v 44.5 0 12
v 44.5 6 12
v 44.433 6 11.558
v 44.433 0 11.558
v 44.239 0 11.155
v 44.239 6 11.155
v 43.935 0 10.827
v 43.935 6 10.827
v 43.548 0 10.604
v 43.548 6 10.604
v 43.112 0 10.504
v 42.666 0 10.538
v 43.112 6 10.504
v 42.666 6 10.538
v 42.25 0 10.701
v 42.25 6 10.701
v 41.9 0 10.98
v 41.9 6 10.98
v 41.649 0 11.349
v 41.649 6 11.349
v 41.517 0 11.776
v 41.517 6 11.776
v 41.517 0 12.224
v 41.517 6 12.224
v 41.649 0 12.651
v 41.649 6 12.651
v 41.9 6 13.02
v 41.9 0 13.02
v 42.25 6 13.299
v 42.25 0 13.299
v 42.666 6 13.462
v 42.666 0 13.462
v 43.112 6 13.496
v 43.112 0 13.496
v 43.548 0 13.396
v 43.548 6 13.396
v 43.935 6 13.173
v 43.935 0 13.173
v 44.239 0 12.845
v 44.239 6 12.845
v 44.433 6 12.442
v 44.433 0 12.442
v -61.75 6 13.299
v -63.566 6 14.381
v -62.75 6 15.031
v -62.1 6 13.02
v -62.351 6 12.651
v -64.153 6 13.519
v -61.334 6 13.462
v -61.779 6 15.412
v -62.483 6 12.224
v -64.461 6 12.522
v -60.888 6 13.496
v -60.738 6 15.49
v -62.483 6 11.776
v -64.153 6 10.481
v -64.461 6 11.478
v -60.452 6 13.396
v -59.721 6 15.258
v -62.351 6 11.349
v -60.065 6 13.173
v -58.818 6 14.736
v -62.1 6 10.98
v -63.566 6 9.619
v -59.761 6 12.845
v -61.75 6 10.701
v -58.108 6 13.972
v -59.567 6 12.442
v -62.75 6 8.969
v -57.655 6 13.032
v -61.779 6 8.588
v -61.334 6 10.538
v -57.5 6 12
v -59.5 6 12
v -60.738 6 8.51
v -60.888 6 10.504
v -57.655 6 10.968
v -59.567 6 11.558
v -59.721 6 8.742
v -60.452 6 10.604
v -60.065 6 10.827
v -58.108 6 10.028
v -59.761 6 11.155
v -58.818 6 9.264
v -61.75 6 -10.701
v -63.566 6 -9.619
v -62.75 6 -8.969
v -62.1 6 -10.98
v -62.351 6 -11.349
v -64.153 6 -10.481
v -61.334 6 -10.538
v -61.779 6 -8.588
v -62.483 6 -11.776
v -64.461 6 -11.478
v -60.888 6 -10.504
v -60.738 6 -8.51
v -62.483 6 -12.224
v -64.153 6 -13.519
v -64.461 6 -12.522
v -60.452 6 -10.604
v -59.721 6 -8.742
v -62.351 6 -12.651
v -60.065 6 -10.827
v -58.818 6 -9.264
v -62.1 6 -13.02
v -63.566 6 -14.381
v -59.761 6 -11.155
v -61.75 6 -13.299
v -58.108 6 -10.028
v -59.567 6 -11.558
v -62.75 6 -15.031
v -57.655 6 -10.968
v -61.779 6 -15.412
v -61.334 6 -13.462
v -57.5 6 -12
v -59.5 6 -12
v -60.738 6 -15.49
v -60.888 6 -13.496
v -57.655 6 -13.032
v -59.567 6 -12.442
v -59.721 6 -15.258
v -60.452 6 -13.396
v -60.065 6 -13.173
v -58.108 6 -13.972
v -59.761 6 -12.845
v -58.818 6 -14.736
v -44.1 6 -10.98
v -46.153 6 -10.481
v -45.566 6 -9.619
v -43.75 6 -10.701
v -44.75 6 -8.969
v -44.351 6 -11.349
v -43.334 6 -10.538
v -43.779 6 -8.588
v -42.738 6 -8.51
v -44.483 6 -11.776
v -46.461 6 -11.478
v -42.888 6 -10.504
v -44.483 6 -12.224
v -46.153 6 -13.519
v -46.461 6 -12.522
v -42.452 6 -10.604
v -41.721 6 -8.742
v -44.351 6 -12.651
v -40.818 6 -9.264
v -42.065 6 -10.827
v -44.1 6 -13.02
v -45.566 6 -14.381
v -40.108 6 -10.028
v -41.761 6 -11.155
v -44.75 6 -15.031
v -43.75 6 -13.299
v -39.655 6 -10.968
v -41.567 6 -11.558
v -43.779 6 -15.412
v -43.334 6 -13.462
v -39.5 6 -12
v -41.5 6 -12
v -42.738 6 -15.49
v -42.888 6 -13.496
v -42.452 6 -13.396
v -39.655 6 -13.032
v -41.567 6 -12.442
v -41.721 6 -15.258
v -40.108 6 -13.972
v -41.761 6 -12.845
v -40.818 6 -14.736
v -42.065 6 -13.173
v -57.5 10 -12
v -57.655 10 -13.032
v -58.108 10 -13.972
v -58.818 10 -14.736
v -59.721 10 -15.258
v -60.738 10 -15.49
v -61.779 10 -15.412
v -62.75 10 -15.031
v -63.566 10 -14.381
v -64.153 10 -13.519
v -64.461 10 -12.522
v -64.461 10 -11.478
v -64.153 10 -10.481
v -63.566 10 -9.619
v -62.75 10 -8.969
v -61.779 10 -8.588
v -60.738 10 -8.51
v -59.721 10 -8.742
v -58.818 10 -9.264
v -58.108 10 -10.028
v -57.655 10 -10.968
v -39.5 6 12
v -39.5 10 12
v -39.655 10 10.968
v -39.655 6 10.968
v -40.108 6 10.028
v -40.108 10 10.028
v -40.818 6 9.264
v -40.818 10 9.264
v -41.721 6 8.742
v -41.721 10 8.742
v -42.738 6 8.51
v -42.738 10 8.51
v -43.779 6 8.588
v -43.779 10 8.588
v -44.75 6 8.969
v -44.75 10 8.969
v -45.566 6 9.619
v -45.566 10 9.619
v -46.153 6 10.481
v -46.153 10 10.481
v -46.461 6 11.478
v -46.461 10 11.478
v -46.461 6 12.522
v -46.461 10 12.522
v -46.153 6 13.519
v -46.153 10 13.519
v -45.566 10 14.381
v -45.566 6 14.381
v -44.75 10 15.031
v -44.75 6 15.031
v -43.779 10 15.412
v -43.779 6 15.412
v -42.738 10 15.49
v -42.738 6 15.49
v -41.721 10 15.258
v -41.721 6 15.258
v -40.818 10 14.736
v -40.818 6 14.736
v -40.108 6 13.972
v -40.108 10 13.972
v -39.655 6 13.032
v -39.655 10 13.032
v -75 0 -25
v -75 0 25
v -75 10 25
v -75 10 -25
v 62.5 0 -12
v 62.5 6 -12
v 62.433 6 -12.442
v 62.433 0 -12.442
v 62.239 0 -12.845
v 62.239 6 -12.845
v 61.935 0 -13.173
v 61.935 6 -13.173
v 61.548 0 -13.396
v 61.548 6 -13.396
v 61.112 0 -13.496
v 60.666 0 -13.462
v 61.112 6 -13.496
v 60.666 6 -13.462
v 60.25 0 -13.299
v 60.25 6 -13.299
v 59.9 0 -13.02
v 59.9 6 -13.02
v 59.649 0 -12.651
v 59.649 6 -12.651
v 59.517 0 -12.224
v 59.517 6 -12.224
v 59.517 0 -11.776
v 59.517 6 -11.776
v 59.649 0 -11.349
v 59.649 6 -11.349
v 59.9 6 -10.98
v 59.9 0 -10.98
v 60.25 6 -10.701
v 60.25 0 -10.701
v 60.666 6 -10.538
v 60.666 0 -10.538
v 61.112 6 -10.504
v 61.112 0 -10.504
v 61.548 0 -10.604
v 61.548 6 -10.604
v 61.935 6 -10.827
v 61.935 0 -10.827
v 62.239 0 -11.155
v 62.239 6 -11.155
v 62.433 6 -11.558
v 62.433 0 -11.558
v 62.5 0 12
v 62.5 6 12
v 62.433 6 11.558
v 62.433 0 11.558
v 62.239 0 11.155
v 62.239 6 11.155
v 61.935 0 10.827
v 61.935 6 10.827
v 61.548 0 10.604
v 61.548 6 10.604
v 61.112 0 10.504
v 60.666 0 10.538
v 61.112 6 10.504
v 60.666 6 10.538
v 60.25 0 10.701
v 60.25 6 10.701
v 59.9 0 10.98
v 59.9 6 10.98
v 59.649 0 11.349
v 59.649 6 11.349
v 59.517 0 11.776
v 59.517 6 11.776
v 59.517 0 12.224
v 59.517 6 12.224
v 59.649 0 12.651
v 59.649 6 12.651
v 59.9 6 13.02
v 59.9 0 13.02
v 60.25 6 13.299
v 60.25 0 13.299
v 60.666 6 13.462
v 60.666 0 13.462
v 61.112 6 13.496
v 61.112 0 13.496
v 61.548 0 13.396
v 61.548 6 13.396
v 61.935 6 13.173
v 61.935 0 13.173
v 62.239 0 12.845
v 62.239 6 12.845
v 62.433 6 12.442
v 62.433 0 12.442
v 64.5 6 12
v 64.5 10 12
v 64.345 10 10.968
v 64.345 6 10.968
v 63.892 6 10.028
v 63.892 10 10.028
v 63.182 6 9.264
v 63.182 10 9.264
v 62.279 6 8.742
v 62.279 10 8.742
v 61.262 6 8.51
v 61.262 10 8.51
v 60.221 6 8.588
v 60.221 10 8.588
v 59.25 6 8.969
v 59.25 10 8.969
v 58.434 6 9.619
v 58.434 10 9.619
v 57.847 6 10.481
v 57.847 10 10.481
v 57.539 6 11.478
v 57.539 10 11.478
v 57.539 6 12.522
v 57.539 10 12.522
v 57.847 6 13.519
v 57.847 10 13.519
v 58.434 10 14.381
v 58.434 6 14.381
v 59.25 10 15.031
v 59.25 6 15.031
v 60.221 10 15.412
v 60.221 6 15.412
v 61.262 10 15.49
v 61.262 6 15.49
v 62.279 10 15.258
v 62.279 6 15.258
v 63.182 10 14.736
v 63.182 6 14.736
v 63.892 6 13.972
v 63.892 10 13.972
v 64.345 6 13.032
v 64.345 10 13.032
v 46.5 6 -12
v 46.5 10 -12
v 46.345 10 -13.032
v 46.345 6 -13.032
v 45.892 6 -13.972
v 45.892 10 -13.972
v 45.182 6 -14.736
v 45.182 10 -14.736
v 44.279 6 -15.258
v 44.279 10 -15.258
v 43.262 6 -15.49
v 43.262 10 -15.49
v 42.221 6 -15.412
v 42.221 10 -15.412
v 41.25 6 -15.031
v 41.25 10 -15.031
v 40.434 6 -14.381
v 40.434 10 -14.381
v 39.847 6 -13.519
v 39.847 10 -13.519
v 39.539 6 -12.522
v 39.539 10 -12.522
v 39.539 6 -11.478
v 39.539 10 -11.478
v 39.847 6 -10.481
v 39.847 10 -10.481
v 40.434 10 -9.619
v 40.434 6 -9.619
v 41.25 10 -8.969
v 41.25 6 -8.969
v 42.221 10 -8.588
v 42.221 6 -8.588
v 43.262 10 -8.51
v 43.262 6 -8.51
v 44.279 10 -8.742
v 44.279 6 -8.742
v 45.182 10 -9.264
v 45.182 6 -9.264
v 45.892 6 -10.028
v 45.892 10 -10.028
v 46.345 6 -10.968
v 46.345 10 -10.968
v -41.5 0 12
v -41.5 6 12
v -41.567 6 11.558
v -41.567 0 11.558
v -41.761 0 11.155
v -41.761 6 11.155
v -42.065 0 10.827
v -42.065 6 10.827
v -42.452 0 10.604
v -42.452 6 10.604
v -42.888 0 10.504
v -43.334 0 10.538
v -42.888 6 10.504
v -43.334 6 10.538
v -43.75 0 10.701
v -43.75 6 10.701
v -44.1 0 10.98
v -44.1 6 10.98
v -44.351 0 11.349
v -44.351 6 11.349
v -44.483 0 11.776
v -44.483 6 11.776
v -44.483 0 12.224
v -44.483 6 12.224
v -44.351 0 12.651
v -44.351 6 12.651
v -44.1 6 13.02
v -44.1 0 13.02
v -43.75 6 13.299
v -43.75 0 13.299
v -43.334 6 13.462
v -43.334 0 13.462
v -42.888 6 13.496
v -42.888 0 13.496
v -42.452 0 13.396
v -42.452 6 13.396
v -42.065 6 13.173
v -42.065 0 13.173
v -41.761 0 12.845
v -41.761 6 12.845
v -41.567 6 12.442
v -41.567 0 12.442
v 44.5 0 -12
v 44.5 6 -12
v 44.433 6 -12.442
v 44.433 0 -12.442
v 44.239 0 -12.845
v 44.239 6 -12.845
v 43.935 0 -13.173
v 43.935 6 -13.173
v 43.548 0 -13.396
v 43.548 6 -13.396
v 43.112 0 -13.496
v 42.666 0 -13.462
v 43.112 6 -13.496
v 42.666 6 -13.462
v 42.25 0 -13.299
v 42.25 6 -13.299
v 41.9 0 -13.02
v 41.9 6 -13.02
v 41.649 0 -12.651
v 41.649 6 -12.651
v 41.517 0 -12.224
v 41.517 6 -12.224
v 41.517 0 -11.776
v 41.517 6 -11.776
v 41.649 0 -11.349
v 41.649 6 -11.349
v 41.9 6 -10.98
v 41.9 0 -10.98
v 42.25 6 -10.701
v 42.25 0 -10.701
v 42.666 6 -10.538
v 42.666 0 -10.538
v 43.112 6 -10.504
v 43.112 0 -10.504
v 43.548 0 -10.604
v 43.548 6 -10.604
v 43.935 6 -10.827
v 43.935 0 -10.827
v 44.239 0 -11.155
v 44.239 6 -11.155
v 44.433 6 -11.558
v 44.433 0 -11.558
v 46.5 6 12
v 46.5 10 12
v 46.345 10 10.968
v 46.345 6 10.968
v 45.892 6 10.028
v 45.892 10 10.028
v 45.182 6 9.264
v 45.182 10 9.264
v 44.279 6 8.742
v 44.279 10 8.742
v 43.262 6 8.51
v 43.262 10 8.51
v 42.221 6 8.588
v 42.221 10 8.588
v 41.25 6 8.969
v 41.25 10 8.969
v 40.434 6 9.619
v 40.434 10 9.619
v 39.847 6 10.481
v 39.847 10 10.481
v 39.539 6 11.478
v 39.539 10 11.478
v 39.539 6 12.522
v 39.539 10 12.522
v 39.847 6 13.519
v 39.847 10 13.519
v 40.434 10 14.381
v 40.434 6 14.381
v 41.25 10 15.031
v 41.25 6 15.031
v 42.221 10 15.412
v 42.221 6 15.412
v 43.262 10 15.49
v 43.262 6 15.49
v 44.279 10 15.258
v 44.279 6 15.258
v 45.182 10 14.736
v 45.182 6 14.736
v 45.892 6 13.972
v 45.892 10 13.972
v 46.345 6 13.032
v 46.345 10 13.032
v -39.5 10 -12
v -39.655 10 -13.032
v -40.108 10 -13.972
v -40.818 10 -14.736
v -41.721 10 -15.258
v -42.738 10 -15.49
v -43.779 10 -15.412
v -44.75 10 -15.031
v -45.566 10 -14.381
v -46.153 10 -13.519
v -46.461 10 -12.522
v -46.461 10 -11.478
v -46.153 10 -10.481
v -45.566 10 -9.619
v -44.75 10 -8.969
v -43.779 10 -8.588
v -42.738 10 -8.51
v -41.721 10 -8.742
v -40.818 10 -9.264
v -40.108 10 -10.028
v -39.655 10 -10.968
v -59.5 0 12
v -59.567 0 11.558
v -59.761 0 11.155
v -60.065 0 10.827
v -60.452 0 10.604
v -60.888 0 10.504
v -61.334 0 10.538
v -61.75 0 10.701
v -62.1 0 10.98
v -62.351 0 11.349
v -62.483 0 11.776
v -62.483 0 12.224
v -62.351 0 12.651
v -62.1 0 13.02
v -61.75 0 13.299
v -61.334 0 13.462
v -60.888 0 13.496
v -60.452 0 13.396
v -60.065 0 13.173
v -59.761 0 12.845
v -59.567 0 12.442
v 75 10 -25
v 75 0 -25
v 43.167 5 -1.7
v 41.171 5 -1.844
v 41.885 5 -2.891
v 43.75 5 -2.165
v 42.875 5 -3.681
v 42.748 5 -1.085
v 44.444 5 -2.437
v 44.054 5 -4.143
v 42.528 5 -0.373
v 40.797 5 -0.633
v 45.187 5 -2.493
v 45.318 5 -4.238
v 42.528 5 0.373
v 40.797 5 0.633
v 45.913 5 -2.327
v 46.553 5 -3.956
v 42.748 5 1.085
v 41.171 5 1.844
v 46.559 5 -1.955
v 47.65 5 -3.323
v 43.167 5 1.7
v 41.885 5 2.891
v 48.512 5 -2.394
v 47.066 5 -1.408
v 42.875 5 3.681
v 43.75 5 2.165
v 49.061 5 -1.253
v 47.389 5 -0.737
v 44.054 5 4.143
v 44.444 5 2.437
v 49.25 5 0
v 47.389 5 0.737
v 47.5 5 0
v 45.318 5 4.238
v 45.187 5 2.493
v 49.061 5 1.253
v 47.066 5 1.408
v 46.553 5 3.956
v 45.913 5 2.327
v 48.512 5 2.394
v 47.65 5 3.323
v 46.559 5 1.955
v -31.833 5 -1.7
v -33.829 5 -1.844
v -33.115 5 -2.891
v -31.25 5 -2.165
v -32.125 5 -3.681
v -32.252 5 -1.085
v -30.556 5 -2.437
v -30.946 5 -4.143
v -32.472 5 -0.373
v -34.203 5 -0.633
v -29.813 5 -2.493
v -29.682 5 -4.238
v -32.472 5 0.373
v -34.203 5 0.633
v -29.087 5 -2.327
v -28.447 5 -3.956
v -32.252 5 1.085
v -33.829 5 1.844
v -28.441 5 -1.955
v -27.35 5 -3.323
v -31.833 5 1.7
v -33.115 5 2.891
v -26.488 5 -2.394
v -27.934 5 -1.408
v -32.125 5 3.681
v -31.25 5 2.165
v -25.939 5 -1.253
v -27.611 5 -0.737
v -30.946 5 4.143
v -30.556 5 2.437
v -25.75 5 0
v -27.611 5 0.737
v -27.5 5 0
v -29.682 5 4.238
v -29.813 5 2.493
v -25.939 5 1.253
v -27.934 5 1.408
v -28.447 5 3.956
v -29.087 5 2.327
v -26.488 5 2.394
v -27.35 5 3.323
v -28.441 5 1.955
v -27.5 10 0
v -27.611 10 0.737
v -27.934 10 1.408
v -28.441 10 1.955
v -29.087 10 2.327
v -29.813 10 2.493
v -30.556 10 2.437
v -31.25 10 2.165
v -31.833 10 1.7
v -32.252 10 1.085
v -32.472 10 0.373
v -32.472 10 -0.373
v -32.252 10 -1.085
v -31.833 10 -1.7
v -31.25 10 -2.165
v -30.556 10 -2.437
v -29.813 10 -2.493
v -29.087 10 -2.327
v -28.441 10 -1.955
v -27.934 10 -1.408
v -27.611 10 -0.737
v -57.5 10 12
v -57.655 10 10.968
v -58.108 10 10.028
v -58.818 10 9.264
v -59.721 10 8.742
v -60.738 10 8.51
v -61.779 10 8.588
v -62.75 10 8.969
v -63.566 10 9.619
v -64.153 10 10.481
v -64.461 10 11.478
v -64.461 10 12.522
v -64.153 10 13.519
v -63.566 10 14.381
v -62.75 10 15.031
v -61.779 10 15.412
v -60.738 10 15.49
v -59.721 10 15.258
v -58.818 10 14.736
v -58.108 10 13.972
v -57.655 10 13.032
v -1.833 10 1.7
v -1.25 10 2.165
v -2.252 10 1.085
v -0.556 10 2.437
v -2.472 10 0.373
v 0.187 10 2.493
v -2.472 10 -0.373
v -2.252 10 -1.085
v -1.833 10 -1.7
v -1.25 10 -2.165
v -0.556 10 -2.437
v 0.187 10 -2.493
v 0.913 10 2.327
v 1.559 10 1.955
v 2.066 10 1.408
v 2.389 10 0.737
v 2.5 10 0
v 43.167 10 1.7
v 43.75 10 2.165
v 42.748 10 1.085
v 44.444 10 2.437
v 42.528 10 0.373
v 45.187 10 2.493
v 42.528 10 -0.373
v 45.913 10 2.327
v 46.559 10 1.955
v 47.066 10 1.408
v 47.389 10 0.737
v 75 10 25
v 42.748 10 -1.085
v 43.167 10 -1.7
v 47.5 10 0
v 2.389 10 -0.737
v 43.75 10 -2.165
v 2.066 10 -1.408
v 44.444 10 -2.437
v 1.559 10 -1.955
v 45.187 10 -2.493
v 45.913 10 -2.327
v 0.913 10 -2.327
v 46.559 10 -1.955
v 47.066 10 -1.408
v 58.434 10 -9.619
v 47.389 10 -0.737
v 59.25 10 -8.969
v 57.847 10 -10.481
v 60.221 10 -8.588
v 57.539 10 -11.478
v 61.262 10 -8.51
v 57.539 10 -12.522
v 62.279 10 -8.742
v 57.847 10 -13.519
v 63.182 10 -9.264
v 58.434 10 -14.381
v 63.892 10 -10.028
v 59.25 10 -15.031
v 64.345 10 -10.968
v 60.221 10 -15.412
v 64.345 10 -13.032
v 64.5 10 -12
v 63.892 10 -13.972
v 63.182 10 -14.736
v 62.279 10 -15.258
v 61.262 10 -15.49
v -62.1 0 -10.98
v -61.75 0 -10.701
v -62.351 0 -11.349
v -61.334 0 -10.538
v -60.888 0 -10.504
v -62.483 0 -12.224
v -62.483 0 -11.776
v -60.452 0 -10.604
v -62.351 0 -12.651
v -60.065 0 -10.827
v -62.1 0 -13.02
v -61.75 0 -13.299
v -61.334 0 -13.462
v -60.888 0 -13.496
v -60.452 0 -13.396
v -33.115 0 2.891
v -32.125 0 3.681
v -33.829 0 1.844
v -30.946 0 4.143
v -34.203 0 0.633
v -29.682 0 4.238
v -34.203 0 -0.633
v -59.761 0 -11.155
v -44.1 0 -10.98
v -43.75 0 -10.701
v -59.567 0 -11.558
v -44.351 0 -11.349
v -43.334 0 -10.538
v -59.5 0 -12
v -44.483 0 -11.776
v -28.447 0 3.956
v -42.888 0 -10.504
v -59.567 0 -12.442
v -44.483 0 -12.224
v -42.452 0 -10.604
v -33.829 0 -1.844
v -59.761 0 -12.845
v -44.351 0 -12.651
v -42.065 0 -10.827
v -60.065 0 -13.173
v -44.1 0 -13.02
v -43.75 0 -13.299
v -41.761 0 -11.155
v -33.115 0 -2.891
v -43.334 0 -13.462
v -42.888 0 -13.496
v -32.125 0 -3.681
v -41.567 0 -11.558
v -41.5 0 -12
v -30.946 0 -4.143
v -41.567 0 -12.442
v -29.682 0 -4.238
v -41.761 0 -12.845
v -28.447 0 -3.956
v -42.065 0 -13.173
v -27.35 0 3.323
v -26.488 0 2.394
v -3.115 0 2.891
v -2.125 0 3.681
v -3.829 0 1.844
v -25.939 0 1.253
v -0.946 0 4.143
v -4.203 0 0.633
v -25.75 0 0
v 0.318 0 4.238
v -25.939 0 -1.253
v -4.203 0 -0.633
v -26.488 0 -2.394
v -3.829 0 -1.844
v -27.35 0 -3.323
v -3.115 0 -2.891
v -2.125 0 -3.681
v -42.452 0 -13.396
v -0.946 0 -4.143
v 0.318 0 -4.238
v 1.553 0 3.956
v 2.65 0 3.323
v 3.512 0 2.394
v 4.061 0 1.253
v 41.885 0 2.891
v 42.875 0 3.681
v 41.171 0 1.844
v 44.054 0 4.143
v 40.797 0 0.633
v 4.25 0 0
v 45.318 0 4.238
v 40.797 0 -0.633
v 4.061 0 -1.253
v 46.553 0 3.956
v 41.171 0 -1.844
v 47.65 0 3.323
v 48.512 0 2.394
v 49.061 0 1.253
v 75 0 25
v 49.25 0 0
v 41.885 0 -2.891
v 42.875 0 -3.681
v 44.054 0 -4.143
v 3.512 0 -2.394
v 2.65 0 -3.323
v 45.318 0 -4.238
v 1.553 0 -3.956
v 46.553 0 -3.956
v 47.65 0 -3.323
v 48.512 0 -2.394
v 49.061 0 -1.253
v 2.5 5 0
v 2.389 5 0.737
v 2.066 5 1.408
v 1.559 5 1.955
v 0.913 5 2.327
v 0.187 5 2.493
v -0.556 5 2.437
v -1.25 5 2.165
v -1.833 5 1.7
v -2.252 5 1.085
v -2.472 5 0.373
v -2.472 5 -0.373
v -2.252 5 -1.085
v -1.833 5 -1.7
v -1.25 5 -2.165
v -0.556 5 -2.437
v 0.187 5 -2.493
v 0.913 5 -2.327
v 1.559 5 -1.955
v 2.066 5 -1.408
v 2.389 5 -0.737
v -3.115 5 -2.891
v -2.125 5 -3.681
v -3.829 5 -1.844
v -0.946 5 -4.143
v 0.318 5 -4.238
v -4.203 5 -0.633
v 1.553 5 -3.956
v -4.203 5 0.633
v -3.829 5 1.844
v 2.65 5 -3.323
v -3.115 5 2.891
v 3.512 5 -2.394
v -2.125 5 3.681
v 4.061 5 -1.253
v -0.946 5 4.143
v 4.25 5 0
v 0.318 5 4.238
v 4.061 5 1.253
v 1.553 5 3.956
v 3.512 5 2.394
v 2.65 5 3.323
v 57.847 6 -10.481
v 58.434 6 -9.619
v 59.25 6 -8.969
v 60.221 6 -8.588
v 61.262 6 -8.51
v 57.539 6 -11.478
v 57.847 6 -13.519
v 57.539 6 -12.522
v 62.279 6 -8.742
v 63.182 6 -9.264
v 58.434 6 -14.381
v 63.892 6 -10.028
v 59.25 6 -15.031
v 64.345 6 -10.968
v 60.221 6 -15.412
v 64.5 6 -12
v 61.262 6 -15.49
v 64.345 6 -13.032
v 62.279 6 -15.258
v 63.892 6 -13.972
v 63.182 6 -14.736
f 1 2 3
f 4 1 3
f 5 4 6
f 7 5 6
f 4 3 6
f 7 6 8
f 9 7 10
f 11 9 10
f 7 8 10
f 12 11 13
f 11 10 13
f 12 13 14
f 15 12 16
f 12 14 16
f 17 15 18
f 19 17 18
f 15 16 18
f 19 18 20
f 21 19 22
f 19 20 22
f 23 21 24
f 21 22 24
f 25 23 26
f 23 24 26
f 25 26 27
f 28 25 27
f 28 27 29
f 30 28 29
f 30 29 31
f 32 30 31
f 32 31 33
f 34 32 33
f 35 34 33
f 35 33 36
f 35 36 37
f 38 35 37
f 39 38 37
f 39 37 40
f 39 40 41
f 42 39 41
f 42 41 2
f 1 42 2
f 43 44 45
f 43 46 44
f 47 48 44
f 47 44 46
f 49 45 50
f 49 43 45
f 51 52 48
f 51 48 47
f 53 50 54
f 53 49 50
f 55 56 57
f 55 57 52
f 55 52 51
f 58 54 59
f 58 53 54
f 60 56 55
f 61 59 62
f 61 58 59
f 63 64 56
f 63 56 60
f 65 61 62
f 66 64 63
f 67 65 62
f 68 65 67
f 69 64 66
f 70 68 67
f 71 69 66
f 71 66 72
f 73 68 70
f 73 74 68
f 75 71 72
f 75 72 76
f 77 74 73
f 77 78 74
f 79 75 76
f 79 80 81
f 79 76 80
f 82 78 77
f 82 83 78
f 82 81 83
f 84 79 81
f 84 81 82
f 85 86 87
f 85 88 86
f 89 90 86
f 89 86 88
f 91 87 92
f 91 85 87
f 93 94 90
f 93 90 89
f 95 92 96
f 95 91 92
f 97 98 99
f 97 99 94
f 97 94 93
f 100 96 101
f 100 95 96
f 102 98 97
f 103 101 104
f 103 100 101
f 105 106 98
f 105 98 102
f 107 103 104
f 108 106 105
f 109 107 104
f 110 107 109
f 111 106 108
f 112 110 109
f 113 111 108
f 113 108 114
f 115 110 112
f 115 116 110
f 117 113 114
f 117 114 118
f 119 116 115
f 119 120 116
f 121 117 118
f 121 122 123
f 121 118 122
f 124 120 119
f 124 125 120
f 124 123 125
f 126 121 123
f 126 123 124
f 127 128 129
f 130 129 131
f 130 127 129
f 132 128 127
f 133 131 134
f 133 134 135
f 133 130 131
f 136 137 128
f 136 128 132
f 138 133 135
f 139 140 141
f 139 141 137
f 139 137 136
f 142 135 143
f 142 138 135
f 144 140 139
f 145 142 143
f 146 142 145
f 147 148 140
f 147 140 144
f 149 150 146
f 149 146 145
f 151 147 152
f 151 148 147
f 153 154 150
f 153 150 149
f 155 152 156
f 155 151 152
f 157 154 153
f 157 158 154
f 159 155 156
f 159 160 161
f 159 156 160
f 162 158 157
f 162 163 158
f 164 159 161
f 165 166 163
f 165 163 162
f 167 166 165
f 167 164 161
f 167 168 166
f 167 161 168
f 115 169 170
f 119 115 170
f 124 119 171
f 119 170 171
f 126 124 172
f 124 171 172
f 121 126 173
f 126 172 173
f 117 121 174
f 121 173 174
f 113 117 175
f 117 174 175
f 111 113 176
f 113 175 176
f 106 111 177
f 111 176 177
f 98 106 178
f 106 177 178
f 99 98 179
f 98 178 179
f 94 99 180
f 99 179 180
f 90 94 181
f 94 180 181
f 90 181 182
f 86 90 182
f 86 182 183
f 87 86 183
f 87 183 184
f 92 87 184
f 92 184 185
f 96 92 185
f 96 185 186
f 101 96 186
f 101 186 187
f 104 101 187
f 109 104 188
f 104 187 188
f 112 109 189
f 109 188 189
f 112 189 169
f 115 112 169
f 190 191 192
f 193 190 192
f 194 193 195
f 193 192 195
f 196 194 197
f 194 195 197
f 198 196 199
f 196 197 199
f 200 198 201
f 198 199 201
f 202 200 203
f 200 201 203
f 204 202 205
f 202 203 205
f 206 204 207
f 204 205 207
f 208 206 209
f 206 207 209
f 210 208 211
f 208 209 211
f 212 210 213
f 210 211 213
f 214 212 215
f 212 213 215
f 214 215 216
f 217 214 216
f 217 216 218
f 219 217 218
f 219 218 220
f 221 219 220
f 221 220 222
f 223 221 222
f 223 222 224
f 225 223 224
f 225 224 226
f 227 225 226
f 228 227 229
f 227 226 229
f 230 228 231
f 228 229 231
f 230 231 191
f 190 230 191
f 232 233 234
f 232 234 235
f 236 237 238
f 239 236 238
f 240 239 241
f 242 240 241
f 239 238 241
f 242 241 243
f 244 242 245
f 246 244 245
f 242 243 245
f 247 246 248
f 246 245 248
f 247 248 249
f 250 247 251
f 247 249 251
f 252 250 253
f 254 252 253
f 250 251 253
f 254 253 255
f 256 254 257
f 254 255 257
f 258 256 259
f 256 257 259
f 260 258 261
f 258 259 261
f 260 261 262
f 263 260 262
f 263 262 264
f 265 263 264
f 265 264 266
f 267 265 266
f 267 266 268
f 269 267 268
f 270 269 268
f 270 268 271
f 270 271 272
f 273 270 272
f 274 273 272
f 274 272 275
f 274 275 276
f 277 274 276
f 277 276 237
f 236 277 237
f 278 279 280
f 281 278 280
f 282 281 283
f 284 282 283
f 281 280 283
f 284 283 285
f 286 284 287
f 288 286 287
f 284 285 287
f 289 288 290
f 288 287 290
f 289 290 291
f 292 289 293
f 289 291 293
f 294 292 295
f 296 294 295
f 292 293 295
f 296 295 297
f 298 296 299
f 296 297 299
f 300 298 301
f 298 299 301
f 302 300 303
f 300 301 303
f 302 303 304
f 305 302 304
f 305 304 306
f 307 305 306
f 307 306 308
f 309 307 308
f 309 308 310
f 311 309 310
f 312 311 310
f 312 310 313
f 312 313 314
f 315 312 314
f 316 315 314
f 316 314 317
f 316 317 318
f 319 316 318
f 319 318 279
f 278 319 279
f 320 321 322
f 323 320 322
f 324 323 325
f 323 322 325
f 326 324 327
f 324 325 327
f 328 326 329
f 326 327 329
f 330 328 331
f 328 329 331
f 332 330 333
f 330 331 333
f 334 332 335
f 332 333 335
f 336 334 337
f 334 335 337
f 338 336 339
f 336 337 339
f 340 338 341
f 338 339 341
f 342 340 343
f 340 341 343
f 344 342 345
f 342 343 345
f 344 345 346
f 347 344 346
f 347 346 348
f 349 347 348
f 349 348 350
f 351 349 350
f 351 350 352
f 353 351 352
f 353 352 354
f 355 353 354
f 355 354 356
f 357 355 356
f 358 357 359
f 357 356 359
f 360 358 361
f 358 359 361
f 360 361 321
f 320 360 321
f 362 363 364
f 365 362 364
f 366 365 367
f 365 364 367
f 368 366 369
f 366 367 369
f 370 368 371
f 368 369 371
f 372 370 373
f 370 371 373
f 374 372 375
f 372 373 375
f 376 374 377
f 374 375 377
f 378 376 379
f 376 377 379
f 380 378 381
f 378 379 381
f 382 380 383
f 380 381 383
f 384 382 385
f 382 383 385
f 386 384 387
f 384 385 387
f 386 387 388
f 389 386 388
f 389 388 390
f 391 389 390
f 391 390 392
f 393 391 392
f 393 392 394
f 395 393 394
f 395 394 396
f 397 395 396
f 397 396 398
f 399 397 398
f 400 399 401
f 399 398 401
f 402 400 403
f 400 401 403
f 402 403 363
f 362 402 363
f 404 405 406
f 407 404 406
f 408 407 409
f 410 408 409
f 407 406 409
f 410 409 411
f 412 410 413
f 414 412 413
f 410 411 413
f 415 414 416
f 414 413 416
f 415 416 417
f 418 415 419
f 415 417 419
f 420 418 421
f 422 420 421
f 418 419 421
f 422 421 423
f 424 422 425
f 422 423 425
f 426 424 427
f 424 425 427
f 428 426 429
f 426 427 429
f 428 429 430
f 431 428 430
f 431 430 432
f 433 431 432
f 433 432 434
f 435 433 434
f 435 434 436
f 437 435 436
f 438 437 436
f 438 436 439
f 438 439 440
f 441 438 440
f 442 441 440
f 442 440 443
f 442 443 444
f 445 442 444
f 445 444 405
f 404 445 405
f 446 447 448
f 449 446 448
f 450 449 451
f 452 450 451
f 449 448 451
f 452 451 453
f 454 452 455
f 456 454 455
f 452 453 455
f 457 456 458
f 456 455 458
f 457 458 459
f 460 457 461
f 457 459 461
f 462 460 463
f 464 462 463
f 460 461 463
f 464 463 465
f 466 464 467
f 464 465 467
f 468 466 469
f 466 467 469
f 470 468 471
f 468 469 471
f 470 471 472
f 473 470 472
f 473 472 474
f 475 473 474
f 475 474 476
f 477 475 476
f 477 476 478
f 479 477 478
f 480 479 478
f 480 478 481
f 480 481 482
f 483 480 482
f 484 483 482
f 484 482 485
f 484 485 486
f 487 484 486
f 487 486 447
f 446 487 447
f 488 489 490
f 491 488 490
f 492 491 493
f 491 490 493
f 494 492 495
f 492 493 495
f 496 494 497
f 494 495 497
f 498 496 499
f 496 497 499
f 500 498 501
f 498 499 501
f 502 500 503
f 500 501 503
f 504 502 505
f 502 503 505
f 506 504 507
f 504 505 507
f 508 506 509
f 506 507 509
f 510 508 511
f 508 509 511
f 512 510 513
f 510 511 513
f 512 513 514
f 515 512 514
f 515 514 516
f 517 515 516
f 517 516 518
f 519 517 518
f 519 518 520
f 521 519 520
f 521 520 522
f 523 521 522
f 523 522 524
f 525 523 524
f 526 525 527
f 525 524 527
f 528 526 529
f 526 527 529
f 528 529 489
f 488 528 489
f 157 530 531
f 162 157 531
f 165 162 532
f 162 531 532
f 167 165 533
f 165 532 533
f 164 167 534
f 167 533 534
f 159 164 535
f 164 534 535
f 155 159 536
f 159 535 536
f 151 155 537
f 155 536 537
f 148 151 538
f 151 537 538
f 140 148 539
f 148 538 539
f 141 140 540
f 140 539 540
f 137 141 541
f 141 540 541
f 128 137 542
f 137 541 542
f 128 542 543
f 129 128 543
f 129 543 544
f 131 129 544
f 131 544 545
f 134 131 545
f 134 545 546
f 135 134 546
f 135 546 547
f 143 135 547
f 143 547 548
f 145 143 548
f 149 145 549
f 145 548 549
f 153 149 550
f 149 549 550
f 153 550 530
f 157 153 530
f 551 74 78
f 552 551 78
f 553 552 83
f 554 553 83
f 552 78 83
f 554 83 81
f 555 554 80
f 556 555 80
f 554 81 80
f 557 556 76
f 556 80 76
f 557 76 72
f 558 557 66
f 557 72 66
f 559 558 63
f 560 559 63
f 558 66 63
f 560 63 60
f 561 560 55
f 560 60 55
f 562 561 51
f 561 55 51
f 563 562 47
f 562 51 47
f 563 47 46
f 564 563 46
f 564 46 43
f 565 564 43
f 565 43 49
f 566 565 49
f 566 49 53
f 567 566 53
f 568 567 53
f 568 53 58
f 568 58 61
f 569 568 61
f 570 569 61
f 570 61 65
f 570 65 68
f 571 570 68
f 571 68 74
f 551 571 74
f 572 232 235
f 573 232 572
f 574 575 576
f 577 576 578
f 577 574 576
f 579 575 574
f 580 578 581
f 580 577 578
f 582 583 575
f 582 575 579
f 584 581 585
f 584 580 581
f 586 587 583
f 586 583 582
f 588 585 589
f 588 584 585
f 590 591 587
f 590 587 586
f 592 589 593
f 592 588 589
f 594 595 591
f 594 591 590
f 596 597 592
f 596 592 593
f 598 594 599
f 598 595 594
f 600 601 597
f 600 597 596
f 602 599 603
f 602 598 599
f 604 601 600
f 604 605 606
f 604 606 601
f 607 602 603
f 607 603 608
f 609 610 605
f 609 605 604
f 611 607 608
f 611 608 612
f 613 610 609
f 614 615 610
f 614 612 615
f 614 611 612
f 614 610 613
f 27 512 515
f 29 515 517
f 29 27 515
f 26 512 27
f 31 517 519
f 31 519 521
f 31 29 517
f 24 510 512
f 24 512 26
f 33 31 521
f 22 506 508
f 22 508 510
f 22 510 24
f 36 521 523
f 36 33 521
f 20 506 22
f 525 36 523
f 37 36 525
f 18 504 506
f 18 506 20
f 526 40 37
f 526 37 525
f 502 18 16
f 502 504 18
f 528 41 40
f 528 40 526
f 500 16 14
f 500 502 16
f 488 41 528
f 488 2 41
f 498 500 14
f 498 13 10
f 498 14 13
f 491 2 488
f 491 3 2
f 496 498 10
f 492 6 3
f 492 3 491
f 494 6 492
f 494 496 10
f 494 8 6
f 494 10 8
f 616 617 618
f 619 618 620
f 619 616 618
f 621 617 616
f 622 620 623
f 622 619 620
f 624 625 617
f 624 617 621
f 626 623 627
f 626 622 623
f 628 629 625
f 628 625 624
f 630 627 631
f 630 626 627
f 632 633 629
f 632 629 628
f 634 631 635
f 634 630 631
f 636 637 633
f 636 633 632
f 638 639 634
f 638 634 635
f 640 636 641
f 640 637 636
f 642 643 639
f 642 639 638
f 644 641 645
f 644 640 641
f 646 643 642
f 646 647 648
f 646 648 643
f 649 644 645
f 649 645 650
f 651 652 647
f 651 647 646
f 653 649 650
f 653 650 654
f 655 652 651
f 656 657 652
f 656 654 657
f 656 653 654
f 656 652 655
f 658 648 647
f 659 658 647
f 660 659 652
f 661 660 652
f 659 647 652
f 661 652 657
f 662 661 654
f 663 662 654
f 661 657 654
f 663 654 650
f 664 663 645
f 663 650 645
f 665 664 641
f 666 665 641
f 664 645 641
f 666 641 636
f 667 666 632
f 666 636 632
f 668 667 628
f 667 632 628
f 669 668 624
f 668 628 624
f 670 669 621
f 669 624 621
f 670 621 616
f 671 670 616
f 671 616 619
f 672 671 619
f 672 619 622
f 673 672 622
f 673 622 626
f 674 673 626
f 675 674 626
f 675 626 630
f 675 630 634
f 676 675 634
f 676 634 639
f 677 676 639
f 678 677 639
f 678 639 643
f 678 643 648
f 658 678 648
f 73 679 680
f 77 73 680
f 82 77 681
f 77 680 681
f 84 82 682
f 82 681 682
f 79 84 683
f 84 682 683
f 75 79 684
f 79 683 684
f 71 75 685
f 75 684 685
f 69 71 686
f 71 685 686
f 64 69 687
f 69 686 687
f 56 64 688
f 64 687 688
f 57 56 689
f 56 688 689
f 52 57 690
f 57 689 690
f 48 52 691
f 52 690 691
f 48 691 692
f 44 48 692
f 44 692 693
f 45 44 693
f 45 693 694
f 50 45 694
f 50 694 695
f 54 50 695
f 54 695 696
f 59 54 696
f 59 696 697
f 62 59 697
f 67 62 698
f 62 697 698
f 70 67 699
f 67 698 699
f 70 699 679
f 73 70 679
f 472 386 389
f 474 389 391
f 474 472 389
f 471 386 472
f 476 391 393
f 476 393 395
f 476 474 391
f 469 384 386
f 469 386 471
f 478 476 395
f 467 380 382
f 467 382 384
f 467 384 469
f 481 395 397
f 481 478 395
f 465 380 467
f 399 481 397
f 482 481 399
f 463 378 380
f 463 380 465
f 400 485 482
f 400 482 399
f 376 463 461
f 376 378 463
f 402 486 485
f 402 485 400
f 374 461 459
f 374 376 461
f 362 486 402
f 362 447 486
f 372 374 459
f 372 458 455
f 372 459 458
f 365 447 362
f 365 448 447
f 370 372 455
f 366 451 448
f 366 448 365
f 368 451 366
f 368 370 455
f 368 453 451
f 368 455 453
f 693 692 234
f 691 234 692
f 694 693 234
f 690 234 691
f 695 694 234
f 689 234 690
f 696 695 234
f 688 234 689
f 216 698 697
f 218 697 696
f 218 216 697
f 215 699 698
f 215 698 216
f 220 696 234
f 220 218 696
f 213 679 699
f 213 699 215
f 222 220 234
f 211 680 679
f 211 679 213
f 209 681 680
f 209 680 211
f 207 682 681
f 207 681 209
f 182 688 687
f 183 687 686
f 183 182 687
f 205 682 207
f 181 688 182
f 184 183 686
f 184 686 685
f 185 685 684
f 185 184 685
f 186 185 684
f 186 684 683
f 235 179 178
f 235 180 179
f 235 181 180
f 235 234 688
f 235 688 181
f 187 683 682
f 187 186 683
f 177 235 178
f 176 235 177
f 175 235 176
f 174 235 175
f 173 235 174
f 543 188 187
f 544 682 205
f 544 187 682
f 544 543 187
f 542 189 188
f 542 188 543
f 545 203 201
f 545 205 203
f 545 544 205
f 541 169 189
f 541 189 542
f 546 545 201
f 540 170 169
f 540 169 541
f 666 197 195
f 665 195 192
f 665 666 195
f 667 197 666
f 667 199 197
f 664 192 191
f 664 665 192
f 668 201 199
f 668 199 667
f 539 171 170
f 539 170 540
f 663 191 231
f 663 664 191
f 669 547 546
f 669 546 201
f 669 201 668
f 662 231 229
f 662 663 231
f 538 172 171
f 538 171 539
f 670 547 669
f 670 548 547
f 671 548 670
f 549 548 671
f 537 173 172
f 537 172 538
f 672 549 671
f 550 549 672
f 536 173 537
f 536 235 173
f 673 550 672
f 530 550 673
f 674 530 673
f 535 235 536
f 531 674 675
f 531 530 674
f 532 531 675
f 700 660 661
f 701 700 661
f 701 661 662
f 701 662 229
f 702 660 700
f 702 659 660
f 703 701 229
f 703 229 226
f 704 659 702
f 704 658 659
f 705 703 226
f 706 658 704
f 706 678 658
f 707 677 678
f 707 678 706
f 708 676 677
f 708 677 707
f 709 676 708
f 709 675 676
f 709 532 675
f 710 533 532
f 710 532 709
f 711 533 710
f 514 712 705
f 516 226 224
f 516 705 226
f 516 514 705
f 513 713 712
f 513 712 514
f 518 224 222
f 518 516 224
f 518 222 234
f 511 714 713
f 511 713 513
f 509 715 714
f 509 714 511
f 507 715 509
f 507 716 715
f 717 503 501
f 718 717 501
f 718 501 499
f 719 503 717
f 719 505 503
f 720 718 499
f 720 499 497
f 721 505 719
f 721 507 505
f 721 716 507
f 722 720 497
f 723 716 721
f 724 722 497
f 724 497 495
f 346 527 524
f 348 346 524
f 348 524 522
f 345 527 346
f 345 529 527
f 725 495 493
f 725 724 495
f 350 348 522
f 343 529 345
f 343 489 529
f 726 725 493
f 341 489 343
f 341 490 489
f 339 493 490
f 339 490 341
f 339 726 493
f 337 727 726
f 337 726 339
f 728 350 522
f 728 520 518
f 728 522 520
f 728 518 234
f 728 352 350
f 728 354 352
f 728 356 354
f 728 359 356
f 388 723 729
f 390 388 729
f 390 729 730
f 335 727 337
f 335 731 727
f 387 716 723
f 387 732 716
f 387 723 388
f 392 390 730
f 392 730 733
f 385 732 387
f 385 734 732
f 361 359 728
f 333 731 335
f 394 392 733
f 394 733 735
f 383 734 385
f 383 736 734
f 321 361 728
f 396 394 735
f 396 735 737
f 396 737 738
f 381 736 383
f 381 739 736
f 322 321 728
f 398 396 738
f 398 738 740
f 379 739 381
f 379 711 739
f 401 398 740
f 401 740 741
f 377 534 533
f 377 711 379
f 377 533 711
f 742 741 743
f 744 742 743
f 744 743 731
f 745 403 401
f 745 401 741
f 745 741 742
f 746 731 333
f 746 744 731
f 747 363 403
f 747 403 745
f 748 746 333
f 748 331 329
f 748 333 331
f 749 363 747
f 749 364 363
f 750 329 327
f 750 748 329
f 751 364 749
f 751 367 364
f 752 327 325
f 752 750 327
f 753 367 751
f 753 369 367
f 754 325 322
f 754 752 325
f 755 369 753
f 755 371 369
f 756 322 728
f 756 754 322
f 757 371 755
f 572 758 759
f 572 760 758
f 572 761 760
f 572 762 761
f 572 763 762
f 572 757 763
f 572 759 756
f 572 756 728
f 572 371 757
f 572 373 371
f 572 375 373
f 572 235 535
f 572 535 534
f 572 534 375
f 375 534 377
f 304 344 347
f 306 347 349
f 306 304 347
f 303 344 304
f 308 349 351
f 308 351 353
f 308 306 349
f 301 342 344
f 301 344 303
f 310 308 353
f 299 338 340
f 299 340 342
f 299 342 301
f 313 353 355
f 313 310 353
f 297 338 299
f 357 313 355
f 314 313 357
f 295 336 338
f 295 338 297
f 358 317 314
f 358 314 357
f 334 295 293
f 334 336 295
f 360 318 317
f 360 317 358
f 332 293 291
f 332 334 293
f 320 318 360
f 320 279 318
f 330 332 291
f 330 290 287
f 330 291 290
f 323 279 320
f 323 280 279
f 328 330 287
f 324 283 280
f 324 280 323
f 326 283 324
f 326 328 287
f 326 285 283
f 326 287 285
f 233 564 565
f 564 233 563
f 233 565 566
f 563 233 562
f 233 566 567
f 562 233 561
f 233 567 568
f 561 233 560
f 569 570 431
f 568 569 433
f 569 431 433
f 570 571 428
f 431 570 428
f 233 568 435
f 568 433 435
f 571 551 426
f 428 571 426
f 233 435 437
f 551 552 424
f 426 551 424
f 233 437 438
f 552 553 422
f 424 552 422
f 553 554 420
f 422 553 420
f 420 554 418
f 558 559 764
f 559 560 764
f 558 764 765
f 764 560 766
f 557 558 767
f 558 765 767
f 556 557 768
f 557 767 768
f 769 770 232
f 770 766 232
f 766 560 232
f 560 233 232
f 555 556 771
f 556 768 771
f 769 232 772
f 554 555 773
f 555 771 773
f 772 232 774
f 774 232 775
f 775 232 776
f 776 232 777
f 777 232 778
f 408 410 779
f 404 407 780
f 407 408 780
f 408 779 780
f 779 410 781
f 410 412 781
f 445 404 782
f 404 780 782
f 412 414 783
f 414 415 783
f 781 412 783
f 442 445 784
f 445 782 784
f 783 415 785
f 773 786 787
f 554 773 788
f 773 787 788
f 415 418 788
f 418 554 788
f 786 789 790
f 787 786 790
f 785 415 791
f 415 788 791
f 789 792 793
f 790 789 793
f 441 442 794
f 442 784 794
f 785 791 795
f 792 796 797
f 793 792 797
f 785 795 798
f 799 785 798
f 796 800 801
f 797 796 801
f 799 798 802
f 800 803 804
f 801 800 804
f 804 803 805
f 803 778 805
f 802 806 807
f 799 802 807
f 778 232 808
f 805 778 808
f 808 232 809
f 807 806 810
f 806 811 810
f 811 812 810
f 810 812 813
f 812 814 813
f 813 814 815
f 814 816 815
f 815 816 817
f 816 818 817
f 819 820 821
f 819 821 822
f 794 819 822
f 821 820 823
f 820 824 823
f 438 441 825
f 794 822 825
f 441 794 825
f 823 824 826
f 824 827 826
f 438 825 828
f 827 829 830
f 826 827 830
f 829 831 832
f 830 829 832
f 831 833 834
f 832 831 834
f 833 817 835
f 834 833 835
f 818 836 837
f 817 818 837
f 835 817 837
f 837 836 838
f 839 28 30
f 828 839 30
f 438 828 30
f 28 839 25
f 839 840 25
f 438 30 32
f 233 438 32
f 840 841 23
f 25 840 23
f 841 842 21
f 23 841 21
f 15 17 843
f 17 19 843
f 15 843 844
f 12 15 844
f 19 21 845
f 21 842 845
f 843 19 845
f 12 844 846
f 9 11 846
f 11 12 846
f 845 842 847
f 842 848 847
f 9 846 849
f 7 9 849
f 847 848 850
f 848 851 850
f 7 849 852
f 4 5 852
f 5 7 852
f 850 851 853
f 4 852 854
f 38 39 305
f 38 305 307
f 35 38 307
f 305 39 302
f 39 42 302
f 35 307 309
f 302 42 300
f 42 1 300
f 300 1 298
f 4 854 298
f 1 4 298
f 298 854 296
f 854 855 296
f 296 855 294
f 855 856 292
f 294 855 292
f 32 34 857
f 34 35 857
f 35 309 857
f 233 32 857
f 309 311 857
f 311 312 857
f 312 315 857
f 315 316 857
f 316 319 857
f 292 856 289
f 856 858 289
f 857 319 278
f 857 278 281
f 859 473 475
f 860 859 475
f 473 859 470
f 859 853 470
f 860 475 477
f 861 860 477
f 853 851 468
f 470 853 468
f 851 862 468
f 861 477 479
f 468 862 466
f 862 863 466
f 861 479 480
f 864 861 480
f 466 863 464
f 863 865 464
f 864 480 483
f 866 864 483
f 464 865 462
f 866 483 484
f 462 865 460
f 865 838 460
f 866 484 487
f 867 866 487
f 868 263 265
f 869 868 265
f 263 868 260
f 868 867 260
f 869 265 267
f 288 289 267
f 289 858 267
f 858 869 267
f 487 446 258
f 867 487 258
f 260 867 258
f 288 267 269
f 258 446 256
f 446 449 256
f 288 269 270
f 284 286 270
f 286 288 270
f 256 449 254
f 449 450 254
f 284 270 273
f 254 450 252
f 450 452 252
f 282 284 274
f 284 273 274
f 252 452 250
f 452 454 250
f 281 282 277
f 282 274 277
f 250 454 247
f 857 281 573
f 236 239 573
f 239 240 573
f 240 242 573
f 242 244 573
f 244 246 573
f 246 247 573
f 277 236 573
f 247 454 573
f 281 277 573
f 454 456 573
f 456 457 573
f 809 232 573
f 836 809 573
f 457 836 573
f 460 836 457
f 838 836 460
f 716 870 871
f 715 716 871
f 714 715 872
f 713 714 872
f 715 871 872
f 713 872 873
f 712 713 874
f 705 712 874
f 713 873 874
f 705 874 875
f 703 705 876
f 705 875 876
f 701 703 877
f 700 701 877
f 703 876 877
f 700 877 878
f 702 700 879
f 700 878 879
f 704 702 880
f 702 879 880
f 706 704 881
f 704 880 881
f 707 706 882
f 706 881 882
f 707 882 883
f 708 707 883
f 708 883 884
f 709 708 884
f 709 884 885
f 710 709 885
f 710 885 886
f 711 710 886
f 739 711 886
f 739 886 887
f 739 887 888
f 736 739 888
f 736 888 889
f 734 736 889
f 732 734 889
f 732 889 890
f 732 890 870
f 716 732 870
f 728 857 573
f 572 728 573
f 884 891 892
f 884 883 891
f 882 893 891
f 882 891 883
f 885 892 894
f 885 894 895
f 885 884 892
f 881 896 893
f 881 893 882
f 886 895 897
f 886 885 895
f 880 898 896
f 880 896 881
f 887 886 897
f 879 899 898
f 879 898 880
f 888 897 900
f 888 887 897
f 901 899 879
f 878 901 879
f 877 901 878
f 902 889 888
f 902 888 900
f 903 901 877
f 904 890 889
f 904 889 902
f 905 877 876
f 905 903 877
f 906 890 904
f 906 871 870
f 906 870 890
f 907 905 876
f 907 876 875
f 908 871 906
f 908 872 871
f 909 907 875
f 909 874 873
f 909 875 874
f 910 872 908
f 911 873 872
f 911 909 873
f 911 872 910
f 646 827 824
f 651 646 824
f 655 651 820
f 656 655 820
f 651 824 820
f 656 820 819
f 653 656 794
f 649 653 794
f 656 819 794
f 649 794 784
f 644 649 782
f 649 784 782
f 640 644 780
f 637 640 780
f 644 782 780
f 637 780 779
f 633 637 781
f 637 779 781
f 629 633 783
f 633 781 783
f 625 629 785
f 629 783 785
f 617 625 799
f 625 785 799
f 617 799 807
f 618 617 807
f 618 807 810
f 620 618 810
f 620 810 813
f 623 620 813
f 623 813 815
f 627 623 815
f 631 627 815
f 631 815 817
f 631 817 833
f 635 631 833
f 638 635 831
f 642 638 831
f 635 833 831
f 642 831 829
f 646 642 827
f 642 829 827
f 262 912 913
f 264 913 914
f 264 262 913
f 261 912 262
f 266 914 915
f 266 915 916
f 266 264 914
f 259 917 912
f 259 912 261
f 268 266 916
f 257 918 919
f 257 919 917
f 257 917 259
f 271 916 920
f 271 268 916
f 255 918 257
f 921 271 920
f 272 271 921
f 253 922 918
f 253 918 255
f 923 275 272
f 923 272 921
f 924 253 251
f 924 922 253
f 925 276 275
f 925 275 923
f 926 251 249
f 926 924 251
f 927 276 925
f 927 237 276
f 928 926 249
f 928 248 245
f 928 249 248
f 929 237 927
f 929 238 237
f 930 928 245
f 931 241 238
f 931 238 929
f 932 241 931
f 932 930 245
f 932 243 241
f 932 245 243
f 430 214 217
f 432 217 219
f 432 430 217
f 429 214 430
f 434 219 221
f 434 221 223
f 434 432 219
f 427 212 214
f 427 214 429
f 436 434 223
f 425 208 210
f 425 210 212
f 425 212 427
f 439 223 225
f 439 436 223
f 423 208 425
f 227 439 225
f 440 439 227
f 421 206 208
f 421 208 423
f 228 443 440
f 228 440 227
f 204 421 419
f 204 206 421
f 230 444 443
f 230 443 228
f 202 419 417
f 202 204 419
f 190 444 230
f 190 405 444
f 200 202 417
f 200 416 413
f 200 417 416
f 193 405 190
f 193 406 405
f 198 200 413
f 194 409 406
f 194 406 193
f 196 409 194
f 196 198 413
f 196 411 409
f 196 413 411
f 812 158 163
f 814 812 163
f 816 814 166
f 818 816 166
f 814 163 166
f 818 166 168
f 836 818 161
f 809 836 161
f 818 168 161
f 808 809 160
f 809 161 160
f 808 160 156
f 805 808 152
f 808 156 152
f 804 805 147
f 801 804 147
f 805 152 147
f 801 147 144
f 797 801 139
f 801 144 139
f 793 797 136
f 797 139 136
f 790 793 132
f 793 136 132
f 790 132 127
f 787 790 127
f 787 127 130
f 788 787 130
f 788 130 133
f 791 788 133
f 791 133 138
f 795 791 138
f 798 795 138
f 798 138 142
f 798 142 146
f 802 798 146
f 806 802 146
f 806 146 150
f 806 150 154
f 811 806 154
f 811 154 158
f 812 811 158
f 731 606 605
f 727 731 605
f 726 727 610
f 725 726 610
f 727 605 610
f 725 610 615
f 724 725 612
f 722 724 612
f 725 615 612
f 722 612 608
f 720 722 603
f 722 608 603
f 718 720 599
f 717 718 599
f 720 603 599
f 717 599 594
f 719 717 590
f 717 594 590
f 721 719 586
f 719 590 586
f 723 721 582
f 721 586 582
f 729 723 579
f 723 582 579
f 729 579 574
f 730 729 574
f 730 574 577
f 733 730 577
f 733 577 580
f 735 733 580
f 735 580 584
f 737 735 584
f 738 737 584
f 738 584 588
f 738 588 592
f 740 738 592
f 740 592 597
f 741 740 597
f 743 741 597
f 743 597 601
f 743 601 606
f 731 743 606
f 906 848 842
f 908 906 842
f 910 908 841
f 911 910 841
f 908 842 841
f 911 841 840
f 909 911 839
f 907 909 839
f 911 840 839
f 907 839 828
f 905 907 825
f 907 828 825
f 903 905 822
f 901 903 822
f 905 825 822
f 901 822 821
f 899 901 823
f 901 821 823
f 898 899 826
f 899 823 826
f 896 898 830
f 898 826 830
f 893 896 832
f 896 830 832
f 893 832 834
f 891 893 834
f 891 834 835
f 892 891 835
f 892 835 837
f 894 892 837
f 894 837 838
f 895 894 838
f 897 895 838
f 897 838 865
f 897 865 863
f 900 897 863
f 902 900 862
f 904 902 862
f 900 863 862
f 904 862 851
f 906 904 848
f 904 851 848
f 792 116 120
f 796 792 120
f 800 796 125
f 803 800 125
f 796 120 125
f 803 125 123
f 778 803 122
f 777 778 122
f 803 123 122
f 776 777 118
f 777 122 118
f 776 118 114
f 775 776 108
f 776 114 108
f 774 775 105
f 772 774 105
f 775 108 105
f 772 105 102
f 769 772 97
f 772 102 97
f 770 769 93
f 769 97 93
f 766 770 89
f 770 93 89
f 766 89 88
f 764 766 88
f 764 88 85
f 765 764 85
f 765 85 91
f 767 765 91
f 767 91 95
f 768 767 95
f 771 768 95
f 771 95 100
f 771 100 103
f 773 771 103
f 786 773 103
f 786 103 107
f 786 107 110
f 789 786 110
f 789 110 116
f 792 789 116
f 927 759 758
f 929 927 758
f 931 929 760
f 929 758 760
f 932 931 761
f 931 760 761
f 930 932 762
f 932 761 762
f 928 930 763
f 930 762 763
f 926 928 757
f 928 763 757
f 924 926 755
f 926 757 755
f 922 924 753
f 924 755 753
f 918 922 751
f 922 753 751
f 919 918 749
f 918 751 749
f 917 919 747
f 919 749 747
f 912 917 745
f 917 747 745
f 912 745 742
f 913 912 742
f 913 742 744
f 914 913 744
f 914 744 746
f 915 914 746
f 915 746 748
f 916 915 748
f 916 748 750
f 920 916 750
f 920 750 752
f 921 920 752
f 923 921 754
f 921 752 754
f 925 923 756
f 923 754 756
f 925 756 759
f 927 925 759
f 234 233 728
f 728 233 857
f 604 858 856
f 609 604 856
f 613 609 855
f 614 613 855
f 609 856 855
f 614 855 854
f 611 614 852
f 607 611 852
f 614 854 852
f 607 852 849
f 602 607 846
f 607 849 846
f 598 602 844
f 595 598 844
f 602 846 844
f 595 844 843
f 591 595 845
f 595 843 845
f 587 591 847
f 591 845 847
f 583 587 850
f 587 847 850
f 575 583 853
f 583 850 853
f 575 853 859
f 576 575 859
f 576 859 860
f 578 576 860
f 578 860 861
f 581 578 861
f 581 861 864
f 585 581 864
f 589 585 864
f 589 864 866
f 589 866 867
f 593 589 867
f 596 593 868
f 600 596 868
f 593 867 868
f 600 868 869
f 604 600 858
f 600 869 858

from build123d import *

# Parameters (mm, degrees)
SKETCH1_W                         = 150
SKETCH1_H                         = 50
BOSS_EXTRUDE1_DEPTH               = 10
SKETCH2_R                         = 1.5
LINEAR_BEARING_MOUNT_DEPTH        = 11
SKETCH3_R                         = 2.5
SURFACE_PROFILE_MOUNT_DEPTH       = 11
SKETCH4_R                         = 4.25
SURF_PROF_MOUNT_COUNTERSINK_DEPTH = 5
SKETCH5_R                         = 3.5
CUT_EXTRUDE1_DEPTH                = 4


with BuildPart() as part:
    # Sketch1 → Boss-Extrude1 (new body)
    with BuildSketch(Plane(origin=(0, 0, 0), x_dir=(1, 0, 0), z_dir=(0, 1, 0))):
        Rectangle(SKETCH1_W, SKETCH1_H)
    extrude(amount=BOSS_EXTRUDE1_DEPTH)

    # Sketch2 → Linear_bearing_mount (cut, through all)
    with BuildSketch(Plane(origin=(0, 10, 0), x_dir=(1, 0, 0), z_dir=(0, 1, 0))):
        with Locations((-43, -12)):
            Circle(SKETCH2_R)
        with Locations((-61, -12)):
            Circle(SKETCH2_R)
        with Locations((43, -12)):
            Circle(SKETCH2_R)
        with Locations((61, -12)):
            Circle(SKETCH2_R)
        with Locations((61, 12)):
            Circle(SKETCH2_R)
        with Locations((43, 12)):
            Circle(SKETCH2_R)
        with Locations((-61, 12)):
            Circle(SKETCH2_R)
        with Locations((-43, 12)):
            Circle(SKETCH2_R)
    extrude(amount=-LINEAR_BEARING_MOUNT_DEPTH, mode=Mode.SUBTRACT)

    # Sketch3 → Surface_profile_mount (cut, through all)
    with BuildSketch(Plane.XZ):
        Circle(SKETCH3_R)
        with Locations((45, 0)):
            Circle(SKETCH3_R)
        with Locations((-30, 0)):
            Circle(SKETCH3_R)
    extrude(amount=-SURFACE_PROFILE_MOUNT_DEPTH, mode=Mode.SUBTRACT)

    # Sketch4 → Surf.prof.mount_countersink (cut)
    with BuildSketch(Plane.XZ):
        with Locations((45, 0)):
            Circle(SKETCH4_R)
        Circle(SKETCH4_R)
        with Locations((-30, 0)):
            Circle(SKETCH4_R)
    extrude(amount=-SURF_PROF_MOUNT_COUNTERSINK_DEPTH, mode=Mode.SUBTRACT)

    # Sketch5 → Cut-Extrude1 (cut)
    with BuildSketch(Plane(origin=(0, 10, 0), x_dir=(1, 0, 0), z_dir=(0, 1, 0))):
        with Locations((-61, 12)):
            Circle(SKETCH5_R)
        with Locations((-43, 12)):
            Circle(SKETCH5_R)
        with Locations((-43, -12)):
            Circle(SKETCH5_R)
        with Locations((-61, -12)):
            Circle(SKETCH5_R)
        with Locations((61, -12)):
            Circle(SKETCH5_R)
        with Locations((43, -12)):
            Circle(SKETCH5_R)
        with Locations((43, 12)):
            Circle(SKETCH5_R)
        with Locations((61, 12)):
            Circle(SKETCH5_R)
    extrude(amount=-CUT_EXTRUDE1_DEPTH, mode=Mode.SUBTRACT)


solid = part.part
